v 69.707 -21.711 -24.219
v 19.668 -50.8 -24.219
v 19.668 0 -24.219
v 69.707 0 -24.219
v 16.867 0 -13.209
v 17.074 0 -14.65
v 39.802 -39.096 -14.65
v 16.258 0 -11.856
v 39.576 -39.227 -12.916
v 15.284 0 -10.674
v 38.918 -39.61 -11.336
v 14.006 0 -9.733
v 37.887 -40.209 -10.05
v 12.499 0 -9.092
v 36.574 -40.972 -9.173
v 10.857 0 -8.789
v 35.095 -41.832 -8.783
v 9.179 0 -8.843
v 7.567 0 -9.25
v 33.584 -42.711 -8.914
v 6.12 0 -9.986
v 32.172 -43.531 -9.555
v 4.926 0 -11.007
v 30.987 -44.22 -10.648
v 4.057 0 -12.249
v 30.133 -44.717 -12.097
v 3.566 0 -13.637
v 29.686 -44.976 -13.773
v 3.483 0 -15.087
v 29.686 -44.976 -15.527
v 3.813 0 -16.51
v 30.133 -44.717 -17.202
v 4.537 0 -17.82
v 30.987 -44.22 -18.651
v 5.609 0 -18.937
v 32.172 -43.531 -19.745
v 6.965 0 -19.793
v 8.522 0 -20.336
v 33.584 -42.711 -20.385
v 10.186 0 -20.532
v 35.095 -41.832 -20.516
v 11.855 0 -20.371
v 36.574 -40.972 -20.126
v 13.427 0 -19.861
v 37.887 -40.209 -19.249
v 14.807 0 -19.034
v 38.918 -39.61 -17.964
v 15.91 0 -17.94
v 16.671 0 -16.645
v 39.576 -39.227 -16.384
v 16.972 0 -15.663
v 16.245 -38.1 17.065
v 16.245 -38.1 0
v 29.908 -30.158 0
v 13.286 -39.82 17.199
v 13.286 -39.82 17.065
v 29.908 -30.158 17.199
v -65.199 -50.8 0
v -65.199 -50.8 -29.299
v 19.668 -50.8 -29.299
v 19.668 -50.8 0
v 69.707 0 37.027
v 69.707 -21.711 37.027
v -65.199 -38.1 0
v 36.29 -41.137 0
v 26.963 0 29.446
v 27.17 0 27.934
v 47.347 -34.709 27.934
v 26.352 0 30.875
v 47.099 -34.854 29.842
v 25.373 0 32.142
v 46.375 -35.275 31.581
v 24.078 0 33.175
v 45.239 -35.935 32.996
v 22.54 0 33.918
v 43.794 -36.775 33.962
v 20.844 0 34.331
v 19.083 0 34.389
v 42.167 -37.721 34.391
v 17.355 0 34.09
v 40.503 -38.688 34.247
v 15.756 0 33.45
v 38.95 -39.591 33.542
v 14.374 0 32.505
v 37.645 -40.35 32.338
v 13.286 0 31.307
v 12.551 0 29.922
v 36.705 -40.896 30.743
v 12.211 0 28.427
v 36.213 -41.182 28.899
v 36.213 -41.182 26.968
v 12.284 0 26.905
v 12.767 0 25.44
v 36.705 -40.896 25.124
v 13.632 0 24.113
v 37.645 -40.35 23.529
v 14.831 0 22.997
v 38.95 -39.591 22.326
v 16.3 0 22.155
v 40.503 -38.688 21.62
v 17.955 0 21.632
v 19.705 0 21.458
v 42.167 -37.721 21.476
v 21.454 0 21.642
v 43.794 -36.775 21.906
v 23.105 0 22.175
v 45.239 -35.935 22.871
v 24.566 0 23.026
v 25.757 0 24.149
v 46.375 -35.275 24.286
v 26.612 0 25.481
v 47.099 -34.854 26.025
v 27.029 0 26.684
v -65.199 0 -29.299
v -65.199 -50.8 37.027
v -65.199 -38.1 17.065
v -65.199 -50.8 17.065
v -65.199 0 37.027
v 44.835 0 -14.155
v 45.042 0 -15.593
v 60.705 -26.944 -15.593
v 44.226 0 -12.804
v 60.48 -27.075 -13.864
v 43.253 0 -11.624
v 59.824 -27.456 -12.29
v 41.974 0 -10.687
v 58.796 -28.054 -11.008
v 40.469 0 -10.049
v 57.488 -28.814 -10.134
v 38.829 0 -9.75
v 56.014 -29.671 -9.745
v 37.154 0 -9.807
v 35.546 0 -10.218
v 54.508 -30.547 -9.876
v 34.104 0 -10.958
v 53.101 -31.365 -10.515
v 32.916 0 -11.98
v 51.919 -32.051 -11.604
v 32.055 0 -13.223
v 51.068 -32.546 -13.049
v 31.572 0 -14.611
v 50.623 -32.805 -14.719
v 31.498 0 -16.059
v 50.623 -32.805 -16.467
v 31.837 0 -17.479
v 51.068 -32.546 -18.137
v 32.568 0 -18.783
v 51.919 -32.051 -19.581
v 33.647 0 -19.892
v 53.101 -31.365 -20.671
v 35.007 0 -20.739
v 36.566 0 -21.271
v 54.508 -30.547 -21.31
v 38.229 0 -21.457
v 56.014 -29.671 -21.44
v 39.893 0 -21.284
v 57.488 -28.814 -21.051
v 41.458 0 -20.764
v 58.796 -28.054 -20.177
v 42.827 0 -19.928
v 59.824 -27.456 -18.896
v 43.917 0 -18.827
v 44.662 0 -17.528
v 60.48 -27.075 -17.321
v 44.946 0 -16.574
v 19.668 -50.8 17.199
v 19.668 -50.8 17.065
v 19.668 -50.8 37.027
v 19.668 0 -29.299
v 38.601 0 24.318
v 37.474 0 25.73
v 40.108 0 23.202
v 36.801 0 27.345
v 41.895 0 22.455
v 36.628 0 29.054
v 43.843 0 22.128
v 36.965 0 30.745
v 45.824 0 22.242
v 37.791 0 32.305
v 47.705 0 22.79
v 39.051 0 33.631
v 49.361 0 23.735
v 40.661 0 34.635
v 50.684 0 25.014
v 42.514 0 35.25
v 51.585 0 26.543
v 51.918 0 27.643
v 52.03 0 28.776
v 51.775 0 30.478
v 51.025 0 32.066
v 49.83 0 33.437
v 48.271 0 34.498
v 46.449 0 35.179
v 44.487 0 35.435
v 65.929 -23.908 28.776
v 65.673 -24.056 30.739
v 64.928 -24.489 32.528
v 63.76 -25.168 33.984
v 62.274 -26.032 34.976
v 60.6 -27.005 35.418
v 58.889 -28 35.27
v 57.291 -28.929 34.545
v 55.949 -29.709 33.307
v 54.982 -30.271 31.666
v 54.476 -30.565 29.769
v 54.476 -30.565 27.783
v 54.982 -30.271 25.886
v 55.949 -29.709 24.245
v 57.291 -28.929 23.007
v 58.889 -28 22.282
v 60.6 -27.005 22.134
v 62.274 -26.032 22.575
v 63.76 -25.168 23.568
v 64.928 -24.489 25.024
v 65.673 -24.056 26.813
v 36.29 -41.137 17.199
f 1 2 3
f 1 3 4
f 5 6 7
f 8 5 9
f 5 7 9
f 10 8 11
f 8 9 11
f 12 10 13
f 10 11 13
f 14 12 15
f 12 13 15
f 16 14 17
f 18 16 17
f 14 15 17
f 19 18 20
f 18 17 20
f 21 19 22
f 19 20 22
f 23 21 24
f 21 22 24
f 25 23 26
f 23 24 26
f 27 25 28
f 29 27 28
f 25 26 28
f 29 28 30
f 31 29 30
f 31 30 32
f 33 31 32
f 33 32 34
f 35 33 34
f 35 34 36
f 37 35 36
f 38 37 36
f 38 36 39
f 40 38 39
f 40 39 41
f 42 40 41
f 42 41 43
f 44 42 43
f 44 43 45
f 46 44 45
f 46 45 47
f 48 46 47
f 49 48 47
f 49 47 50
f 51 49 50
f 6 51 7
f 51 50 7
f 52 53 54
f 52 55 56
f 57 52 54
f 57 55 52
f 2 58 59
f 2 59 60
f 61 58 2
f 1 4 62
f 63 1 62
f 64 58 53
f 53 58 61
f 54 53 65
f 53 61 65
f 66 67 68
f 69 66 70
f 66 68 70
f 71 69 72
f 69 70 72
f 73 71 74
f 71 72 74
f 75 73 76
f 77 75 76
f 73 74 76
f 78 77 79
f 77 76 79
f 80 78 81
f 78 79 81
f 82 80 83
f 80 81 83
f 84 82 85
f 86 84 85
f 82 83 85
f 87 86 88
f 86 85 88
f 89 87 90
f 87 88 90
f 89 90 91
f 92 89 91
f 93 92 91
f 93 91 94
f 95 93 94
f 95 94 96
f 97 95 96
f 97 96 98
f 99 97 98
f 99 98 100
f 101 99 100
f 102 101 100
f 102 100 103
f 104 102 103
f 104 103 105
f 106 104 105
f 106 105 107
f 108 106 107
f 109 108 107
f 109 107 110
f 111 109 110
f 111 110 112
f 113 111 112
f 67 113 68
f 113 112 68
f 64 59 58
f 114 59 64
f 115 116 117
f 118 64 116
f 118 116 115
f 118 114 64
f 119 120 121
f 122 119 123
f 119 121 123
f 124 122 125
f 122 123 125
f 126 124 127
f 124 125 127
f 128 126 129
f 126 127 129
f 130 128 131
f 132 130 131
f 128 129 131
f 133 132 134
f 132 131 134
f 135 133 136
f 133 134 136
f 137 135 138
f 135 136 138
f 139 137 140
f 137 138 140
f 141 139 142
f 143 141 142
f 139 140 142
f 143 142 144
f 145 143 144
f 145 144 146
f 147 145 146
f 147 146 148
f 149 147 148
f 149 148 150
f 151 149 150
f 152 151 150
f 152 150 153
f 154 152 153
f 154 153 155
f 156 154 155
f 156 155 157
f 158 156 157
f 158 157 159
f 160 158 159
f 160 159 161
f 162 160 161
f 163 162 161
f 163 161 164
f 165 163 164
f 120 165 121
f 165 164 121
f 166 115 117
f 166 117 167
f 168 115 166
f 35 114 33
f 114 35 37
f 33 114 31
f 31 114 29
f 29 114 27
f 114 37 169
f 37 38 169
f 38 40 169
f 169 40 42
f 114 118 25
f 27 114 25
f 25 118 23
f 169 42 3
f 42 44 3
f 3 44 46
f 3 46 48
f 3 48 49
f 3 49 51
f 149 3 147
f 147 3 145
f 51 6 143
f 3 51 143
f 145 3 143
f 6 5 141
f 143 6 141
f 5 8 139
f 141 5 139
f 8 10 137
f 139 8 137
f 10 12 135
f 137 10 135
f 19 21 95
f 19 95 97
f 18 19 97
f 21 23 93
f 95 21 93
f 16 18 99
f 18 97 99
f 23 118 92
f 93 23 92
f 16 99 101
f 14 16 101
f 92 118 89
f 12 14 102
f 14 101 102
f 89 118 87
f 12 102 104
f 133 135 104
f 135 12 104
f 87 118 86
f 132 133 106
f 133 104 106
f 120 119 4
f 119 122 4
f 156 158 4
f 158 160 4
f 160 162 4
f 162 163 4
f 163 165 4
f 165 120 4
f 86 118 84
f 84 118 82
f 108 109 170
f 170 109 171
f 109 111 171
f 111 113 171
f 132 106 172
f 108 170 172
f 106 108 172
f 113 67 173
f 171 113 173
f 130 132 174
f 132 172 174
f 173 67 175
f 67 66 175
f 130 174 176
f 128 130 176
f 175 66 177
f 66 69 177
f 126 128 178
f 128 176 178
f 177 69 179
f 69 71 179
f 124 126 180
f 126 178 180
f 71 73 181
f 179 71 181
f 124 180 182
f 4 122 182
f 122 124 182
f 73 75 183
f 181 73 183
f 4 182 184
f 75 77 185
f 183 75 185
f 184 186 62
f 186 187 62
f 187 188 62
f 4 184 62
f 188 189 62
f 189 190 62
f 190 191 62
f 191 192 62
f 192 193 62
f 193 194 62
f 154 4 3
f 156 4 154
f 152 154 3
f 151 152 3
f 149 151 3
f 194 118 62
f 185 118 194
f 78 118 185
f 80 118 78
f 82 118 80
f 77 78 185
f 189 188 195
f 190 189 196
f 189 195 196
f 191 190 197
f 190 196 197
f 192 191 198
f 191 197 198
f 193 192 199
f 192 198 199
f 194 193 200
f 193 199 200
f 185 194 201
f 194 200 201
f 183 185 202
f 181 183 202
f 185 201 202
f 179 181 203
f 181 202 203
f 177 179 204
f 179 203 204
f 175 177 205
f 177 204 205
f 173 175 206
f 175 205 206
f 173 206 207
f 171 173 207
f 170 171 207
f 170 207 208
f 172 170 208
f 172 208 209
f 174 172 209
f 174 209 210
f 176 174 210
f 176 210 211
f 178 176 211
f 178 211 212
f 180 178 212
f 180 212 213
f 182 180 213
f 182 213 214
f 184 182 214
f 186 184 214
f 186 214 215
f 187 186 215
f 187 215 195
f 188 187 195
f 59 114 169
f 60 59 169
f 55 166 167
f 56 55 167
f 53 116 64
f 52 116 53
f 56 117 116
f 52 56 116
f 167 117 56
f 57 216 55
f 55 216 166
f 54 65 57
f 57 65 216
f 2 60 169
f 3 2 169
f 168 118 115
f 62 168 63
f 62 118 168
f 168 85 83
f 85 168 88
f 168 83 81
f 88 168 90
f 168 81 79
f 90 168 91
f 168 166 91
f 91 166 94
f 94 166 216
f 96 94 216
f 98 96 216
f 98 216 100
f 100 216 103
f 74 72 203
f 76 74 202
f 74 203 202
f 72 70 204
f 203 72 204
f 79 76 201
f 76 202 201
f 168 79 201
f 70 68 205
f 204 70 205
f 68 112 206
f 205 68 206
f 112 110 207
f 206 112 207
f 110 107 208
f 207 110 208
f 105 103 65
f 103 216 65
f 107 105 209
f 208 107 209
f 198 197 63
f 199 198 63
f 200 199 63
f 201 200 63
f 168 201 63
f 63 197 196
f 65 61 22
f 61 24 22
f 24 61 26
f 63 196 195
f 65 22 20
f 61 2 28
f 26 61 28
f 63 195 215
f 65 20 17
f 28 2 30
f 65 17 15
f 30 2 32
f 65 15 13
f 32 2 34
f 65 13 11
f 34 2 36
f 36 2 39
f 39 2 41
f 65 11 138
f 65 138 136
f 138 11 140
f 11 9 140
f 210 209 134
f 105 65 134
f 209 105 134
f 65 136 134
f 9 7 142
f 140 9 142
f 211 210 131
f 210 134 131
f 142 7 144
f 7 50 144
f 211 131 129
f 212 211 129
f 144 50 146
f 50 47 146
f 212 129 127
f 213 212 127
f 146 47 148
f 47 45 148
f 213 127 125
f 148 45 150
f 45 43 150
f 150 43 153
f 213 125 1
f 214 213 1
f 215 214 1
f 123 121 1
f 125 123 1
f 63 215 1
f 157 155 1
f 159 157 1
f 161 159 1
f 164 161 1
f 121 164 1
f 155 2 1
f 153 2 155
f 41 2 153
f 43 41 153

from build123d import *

# Parameters (mm, degrees)
F0_W      = 134.9061876535
F0_H      = 66.3261953741
F1_DEPTH  = 50.8
F3_DEPTH  = 66.3271953741
F4_W      = 84.8675490558
F4_H      = 17.0645080507
F5_DEPTH  = 12.7
F7_DEPTH  = 12.7
F8_R      = 5.8831218442
F9_DEPTH  = 86.5717253991
F10_R     = 5.86386151
F10_R_2   = 6.47563258
F10_R_3   = 6.6609419445
F11_DEPTH = 86.5717253991
F13_DEPTH = 5.08


with BuildPart() as f1:
    # F0 (on Front) → F1 (new body)
    with BuildSketch(Plane.XZ):
        with Locations((2.2538006306, 3.86366155)):
            Rectangle(F0_W, F0_H)
    extrude(amount=F1_DEPTH)

    # F2 (on face) → F3 (cut, through all)
    with BuildSketch(Plane(origin=(0, 0, -29.2994361371), x_dir=(1, 0, 0), z_dir=(0, 0, -1))):
        Polygon((69.7068944573, 50.8), (19.6682558596, 50.8), (69.7068944573, 21.7111355625), align=None)
    extrude(amount=-F3_DEPTH, mode=Mode.SUBTRACT)

    # F4 (on face) → F5 (cut)
    with BuildSketch(Plane.XZ.offset(50.8)):
        with Locations((-22.7655186683, 8.5322540253)):
            Rectangle(F4_W, F4_H)
    extrude(amount=-F5_DEPTH, mode=Mode.SUBTRACT)

    # F6 (on face) → F7 (cut)
    with BuildSketch(Plane(origin=(27.0401800955, -46.5144936243, 0), x_dir=(0.864532465, 0.5025769761, 0), z_dir=(0.5025769761, -0.864532465, 0))):
        Polygon((-8.527064667, 17.0645080507), (-8.527064667, 0), (10.6996493414, 0), (10.6996493414, 17.1985588968), (-8.527064667, 17.1985588968), align=None)
    extrude(amount=-F7_DEPTH, mode=Mode.SUBTRACT)

    # F8 (on face) → F9 (cut, through all)
    with BuildSketch(Plane(origin=(27.0401800955, -46.5144936243, 0), x_dir=(0.864532465, 0.5025769761, 0), z_dir=(0.5025769761, -0.864532465, 0))):
        with Locations((8.8778939098, -14.6497180685)):
            Circle(F8_R)
    extrude(amount=-F9_DEPTH, mode=Mode.SUBTRACT)

    # F10 (on face) → F11 (cut, through all)
    with BuildSketch(Plane(origin=(27.0401800955, -46.5144936243, 0), x_dir=(0.864532465, 0.5025769761, 0), z_dir=(0.5025769761, -0.864532465, 0))):
        with Locations((33.0762192607, -15.5928293243)):
            Circle(F10_R)
        with Locations((17.0135609806, 27.9336217791)):
            Circle(F10_R_2)
        with Locations((38.3210889995, 28.7759676576)):
            Circle(F10_R_3)
    extrude(amount=-F11_DEPTH, mode=Mode.SUBTRACT)

    # F12 (on face) → F13 (cut)
    with BuildSketch(Plane(origin=(0, 0, -29.2994361371), x_dir=(1, 0, 0), z_dir=(0, 0, -1))):
        Polygon((69.7068944573, 21.7111355625), (19.6682558596, 50.8), (19.6682558596, 0), (69.7068944573, 0), align=None)
    extrude(amount=-F13_DEPTH, mode=Mode.SUBTRACT)


solid = f1.part
